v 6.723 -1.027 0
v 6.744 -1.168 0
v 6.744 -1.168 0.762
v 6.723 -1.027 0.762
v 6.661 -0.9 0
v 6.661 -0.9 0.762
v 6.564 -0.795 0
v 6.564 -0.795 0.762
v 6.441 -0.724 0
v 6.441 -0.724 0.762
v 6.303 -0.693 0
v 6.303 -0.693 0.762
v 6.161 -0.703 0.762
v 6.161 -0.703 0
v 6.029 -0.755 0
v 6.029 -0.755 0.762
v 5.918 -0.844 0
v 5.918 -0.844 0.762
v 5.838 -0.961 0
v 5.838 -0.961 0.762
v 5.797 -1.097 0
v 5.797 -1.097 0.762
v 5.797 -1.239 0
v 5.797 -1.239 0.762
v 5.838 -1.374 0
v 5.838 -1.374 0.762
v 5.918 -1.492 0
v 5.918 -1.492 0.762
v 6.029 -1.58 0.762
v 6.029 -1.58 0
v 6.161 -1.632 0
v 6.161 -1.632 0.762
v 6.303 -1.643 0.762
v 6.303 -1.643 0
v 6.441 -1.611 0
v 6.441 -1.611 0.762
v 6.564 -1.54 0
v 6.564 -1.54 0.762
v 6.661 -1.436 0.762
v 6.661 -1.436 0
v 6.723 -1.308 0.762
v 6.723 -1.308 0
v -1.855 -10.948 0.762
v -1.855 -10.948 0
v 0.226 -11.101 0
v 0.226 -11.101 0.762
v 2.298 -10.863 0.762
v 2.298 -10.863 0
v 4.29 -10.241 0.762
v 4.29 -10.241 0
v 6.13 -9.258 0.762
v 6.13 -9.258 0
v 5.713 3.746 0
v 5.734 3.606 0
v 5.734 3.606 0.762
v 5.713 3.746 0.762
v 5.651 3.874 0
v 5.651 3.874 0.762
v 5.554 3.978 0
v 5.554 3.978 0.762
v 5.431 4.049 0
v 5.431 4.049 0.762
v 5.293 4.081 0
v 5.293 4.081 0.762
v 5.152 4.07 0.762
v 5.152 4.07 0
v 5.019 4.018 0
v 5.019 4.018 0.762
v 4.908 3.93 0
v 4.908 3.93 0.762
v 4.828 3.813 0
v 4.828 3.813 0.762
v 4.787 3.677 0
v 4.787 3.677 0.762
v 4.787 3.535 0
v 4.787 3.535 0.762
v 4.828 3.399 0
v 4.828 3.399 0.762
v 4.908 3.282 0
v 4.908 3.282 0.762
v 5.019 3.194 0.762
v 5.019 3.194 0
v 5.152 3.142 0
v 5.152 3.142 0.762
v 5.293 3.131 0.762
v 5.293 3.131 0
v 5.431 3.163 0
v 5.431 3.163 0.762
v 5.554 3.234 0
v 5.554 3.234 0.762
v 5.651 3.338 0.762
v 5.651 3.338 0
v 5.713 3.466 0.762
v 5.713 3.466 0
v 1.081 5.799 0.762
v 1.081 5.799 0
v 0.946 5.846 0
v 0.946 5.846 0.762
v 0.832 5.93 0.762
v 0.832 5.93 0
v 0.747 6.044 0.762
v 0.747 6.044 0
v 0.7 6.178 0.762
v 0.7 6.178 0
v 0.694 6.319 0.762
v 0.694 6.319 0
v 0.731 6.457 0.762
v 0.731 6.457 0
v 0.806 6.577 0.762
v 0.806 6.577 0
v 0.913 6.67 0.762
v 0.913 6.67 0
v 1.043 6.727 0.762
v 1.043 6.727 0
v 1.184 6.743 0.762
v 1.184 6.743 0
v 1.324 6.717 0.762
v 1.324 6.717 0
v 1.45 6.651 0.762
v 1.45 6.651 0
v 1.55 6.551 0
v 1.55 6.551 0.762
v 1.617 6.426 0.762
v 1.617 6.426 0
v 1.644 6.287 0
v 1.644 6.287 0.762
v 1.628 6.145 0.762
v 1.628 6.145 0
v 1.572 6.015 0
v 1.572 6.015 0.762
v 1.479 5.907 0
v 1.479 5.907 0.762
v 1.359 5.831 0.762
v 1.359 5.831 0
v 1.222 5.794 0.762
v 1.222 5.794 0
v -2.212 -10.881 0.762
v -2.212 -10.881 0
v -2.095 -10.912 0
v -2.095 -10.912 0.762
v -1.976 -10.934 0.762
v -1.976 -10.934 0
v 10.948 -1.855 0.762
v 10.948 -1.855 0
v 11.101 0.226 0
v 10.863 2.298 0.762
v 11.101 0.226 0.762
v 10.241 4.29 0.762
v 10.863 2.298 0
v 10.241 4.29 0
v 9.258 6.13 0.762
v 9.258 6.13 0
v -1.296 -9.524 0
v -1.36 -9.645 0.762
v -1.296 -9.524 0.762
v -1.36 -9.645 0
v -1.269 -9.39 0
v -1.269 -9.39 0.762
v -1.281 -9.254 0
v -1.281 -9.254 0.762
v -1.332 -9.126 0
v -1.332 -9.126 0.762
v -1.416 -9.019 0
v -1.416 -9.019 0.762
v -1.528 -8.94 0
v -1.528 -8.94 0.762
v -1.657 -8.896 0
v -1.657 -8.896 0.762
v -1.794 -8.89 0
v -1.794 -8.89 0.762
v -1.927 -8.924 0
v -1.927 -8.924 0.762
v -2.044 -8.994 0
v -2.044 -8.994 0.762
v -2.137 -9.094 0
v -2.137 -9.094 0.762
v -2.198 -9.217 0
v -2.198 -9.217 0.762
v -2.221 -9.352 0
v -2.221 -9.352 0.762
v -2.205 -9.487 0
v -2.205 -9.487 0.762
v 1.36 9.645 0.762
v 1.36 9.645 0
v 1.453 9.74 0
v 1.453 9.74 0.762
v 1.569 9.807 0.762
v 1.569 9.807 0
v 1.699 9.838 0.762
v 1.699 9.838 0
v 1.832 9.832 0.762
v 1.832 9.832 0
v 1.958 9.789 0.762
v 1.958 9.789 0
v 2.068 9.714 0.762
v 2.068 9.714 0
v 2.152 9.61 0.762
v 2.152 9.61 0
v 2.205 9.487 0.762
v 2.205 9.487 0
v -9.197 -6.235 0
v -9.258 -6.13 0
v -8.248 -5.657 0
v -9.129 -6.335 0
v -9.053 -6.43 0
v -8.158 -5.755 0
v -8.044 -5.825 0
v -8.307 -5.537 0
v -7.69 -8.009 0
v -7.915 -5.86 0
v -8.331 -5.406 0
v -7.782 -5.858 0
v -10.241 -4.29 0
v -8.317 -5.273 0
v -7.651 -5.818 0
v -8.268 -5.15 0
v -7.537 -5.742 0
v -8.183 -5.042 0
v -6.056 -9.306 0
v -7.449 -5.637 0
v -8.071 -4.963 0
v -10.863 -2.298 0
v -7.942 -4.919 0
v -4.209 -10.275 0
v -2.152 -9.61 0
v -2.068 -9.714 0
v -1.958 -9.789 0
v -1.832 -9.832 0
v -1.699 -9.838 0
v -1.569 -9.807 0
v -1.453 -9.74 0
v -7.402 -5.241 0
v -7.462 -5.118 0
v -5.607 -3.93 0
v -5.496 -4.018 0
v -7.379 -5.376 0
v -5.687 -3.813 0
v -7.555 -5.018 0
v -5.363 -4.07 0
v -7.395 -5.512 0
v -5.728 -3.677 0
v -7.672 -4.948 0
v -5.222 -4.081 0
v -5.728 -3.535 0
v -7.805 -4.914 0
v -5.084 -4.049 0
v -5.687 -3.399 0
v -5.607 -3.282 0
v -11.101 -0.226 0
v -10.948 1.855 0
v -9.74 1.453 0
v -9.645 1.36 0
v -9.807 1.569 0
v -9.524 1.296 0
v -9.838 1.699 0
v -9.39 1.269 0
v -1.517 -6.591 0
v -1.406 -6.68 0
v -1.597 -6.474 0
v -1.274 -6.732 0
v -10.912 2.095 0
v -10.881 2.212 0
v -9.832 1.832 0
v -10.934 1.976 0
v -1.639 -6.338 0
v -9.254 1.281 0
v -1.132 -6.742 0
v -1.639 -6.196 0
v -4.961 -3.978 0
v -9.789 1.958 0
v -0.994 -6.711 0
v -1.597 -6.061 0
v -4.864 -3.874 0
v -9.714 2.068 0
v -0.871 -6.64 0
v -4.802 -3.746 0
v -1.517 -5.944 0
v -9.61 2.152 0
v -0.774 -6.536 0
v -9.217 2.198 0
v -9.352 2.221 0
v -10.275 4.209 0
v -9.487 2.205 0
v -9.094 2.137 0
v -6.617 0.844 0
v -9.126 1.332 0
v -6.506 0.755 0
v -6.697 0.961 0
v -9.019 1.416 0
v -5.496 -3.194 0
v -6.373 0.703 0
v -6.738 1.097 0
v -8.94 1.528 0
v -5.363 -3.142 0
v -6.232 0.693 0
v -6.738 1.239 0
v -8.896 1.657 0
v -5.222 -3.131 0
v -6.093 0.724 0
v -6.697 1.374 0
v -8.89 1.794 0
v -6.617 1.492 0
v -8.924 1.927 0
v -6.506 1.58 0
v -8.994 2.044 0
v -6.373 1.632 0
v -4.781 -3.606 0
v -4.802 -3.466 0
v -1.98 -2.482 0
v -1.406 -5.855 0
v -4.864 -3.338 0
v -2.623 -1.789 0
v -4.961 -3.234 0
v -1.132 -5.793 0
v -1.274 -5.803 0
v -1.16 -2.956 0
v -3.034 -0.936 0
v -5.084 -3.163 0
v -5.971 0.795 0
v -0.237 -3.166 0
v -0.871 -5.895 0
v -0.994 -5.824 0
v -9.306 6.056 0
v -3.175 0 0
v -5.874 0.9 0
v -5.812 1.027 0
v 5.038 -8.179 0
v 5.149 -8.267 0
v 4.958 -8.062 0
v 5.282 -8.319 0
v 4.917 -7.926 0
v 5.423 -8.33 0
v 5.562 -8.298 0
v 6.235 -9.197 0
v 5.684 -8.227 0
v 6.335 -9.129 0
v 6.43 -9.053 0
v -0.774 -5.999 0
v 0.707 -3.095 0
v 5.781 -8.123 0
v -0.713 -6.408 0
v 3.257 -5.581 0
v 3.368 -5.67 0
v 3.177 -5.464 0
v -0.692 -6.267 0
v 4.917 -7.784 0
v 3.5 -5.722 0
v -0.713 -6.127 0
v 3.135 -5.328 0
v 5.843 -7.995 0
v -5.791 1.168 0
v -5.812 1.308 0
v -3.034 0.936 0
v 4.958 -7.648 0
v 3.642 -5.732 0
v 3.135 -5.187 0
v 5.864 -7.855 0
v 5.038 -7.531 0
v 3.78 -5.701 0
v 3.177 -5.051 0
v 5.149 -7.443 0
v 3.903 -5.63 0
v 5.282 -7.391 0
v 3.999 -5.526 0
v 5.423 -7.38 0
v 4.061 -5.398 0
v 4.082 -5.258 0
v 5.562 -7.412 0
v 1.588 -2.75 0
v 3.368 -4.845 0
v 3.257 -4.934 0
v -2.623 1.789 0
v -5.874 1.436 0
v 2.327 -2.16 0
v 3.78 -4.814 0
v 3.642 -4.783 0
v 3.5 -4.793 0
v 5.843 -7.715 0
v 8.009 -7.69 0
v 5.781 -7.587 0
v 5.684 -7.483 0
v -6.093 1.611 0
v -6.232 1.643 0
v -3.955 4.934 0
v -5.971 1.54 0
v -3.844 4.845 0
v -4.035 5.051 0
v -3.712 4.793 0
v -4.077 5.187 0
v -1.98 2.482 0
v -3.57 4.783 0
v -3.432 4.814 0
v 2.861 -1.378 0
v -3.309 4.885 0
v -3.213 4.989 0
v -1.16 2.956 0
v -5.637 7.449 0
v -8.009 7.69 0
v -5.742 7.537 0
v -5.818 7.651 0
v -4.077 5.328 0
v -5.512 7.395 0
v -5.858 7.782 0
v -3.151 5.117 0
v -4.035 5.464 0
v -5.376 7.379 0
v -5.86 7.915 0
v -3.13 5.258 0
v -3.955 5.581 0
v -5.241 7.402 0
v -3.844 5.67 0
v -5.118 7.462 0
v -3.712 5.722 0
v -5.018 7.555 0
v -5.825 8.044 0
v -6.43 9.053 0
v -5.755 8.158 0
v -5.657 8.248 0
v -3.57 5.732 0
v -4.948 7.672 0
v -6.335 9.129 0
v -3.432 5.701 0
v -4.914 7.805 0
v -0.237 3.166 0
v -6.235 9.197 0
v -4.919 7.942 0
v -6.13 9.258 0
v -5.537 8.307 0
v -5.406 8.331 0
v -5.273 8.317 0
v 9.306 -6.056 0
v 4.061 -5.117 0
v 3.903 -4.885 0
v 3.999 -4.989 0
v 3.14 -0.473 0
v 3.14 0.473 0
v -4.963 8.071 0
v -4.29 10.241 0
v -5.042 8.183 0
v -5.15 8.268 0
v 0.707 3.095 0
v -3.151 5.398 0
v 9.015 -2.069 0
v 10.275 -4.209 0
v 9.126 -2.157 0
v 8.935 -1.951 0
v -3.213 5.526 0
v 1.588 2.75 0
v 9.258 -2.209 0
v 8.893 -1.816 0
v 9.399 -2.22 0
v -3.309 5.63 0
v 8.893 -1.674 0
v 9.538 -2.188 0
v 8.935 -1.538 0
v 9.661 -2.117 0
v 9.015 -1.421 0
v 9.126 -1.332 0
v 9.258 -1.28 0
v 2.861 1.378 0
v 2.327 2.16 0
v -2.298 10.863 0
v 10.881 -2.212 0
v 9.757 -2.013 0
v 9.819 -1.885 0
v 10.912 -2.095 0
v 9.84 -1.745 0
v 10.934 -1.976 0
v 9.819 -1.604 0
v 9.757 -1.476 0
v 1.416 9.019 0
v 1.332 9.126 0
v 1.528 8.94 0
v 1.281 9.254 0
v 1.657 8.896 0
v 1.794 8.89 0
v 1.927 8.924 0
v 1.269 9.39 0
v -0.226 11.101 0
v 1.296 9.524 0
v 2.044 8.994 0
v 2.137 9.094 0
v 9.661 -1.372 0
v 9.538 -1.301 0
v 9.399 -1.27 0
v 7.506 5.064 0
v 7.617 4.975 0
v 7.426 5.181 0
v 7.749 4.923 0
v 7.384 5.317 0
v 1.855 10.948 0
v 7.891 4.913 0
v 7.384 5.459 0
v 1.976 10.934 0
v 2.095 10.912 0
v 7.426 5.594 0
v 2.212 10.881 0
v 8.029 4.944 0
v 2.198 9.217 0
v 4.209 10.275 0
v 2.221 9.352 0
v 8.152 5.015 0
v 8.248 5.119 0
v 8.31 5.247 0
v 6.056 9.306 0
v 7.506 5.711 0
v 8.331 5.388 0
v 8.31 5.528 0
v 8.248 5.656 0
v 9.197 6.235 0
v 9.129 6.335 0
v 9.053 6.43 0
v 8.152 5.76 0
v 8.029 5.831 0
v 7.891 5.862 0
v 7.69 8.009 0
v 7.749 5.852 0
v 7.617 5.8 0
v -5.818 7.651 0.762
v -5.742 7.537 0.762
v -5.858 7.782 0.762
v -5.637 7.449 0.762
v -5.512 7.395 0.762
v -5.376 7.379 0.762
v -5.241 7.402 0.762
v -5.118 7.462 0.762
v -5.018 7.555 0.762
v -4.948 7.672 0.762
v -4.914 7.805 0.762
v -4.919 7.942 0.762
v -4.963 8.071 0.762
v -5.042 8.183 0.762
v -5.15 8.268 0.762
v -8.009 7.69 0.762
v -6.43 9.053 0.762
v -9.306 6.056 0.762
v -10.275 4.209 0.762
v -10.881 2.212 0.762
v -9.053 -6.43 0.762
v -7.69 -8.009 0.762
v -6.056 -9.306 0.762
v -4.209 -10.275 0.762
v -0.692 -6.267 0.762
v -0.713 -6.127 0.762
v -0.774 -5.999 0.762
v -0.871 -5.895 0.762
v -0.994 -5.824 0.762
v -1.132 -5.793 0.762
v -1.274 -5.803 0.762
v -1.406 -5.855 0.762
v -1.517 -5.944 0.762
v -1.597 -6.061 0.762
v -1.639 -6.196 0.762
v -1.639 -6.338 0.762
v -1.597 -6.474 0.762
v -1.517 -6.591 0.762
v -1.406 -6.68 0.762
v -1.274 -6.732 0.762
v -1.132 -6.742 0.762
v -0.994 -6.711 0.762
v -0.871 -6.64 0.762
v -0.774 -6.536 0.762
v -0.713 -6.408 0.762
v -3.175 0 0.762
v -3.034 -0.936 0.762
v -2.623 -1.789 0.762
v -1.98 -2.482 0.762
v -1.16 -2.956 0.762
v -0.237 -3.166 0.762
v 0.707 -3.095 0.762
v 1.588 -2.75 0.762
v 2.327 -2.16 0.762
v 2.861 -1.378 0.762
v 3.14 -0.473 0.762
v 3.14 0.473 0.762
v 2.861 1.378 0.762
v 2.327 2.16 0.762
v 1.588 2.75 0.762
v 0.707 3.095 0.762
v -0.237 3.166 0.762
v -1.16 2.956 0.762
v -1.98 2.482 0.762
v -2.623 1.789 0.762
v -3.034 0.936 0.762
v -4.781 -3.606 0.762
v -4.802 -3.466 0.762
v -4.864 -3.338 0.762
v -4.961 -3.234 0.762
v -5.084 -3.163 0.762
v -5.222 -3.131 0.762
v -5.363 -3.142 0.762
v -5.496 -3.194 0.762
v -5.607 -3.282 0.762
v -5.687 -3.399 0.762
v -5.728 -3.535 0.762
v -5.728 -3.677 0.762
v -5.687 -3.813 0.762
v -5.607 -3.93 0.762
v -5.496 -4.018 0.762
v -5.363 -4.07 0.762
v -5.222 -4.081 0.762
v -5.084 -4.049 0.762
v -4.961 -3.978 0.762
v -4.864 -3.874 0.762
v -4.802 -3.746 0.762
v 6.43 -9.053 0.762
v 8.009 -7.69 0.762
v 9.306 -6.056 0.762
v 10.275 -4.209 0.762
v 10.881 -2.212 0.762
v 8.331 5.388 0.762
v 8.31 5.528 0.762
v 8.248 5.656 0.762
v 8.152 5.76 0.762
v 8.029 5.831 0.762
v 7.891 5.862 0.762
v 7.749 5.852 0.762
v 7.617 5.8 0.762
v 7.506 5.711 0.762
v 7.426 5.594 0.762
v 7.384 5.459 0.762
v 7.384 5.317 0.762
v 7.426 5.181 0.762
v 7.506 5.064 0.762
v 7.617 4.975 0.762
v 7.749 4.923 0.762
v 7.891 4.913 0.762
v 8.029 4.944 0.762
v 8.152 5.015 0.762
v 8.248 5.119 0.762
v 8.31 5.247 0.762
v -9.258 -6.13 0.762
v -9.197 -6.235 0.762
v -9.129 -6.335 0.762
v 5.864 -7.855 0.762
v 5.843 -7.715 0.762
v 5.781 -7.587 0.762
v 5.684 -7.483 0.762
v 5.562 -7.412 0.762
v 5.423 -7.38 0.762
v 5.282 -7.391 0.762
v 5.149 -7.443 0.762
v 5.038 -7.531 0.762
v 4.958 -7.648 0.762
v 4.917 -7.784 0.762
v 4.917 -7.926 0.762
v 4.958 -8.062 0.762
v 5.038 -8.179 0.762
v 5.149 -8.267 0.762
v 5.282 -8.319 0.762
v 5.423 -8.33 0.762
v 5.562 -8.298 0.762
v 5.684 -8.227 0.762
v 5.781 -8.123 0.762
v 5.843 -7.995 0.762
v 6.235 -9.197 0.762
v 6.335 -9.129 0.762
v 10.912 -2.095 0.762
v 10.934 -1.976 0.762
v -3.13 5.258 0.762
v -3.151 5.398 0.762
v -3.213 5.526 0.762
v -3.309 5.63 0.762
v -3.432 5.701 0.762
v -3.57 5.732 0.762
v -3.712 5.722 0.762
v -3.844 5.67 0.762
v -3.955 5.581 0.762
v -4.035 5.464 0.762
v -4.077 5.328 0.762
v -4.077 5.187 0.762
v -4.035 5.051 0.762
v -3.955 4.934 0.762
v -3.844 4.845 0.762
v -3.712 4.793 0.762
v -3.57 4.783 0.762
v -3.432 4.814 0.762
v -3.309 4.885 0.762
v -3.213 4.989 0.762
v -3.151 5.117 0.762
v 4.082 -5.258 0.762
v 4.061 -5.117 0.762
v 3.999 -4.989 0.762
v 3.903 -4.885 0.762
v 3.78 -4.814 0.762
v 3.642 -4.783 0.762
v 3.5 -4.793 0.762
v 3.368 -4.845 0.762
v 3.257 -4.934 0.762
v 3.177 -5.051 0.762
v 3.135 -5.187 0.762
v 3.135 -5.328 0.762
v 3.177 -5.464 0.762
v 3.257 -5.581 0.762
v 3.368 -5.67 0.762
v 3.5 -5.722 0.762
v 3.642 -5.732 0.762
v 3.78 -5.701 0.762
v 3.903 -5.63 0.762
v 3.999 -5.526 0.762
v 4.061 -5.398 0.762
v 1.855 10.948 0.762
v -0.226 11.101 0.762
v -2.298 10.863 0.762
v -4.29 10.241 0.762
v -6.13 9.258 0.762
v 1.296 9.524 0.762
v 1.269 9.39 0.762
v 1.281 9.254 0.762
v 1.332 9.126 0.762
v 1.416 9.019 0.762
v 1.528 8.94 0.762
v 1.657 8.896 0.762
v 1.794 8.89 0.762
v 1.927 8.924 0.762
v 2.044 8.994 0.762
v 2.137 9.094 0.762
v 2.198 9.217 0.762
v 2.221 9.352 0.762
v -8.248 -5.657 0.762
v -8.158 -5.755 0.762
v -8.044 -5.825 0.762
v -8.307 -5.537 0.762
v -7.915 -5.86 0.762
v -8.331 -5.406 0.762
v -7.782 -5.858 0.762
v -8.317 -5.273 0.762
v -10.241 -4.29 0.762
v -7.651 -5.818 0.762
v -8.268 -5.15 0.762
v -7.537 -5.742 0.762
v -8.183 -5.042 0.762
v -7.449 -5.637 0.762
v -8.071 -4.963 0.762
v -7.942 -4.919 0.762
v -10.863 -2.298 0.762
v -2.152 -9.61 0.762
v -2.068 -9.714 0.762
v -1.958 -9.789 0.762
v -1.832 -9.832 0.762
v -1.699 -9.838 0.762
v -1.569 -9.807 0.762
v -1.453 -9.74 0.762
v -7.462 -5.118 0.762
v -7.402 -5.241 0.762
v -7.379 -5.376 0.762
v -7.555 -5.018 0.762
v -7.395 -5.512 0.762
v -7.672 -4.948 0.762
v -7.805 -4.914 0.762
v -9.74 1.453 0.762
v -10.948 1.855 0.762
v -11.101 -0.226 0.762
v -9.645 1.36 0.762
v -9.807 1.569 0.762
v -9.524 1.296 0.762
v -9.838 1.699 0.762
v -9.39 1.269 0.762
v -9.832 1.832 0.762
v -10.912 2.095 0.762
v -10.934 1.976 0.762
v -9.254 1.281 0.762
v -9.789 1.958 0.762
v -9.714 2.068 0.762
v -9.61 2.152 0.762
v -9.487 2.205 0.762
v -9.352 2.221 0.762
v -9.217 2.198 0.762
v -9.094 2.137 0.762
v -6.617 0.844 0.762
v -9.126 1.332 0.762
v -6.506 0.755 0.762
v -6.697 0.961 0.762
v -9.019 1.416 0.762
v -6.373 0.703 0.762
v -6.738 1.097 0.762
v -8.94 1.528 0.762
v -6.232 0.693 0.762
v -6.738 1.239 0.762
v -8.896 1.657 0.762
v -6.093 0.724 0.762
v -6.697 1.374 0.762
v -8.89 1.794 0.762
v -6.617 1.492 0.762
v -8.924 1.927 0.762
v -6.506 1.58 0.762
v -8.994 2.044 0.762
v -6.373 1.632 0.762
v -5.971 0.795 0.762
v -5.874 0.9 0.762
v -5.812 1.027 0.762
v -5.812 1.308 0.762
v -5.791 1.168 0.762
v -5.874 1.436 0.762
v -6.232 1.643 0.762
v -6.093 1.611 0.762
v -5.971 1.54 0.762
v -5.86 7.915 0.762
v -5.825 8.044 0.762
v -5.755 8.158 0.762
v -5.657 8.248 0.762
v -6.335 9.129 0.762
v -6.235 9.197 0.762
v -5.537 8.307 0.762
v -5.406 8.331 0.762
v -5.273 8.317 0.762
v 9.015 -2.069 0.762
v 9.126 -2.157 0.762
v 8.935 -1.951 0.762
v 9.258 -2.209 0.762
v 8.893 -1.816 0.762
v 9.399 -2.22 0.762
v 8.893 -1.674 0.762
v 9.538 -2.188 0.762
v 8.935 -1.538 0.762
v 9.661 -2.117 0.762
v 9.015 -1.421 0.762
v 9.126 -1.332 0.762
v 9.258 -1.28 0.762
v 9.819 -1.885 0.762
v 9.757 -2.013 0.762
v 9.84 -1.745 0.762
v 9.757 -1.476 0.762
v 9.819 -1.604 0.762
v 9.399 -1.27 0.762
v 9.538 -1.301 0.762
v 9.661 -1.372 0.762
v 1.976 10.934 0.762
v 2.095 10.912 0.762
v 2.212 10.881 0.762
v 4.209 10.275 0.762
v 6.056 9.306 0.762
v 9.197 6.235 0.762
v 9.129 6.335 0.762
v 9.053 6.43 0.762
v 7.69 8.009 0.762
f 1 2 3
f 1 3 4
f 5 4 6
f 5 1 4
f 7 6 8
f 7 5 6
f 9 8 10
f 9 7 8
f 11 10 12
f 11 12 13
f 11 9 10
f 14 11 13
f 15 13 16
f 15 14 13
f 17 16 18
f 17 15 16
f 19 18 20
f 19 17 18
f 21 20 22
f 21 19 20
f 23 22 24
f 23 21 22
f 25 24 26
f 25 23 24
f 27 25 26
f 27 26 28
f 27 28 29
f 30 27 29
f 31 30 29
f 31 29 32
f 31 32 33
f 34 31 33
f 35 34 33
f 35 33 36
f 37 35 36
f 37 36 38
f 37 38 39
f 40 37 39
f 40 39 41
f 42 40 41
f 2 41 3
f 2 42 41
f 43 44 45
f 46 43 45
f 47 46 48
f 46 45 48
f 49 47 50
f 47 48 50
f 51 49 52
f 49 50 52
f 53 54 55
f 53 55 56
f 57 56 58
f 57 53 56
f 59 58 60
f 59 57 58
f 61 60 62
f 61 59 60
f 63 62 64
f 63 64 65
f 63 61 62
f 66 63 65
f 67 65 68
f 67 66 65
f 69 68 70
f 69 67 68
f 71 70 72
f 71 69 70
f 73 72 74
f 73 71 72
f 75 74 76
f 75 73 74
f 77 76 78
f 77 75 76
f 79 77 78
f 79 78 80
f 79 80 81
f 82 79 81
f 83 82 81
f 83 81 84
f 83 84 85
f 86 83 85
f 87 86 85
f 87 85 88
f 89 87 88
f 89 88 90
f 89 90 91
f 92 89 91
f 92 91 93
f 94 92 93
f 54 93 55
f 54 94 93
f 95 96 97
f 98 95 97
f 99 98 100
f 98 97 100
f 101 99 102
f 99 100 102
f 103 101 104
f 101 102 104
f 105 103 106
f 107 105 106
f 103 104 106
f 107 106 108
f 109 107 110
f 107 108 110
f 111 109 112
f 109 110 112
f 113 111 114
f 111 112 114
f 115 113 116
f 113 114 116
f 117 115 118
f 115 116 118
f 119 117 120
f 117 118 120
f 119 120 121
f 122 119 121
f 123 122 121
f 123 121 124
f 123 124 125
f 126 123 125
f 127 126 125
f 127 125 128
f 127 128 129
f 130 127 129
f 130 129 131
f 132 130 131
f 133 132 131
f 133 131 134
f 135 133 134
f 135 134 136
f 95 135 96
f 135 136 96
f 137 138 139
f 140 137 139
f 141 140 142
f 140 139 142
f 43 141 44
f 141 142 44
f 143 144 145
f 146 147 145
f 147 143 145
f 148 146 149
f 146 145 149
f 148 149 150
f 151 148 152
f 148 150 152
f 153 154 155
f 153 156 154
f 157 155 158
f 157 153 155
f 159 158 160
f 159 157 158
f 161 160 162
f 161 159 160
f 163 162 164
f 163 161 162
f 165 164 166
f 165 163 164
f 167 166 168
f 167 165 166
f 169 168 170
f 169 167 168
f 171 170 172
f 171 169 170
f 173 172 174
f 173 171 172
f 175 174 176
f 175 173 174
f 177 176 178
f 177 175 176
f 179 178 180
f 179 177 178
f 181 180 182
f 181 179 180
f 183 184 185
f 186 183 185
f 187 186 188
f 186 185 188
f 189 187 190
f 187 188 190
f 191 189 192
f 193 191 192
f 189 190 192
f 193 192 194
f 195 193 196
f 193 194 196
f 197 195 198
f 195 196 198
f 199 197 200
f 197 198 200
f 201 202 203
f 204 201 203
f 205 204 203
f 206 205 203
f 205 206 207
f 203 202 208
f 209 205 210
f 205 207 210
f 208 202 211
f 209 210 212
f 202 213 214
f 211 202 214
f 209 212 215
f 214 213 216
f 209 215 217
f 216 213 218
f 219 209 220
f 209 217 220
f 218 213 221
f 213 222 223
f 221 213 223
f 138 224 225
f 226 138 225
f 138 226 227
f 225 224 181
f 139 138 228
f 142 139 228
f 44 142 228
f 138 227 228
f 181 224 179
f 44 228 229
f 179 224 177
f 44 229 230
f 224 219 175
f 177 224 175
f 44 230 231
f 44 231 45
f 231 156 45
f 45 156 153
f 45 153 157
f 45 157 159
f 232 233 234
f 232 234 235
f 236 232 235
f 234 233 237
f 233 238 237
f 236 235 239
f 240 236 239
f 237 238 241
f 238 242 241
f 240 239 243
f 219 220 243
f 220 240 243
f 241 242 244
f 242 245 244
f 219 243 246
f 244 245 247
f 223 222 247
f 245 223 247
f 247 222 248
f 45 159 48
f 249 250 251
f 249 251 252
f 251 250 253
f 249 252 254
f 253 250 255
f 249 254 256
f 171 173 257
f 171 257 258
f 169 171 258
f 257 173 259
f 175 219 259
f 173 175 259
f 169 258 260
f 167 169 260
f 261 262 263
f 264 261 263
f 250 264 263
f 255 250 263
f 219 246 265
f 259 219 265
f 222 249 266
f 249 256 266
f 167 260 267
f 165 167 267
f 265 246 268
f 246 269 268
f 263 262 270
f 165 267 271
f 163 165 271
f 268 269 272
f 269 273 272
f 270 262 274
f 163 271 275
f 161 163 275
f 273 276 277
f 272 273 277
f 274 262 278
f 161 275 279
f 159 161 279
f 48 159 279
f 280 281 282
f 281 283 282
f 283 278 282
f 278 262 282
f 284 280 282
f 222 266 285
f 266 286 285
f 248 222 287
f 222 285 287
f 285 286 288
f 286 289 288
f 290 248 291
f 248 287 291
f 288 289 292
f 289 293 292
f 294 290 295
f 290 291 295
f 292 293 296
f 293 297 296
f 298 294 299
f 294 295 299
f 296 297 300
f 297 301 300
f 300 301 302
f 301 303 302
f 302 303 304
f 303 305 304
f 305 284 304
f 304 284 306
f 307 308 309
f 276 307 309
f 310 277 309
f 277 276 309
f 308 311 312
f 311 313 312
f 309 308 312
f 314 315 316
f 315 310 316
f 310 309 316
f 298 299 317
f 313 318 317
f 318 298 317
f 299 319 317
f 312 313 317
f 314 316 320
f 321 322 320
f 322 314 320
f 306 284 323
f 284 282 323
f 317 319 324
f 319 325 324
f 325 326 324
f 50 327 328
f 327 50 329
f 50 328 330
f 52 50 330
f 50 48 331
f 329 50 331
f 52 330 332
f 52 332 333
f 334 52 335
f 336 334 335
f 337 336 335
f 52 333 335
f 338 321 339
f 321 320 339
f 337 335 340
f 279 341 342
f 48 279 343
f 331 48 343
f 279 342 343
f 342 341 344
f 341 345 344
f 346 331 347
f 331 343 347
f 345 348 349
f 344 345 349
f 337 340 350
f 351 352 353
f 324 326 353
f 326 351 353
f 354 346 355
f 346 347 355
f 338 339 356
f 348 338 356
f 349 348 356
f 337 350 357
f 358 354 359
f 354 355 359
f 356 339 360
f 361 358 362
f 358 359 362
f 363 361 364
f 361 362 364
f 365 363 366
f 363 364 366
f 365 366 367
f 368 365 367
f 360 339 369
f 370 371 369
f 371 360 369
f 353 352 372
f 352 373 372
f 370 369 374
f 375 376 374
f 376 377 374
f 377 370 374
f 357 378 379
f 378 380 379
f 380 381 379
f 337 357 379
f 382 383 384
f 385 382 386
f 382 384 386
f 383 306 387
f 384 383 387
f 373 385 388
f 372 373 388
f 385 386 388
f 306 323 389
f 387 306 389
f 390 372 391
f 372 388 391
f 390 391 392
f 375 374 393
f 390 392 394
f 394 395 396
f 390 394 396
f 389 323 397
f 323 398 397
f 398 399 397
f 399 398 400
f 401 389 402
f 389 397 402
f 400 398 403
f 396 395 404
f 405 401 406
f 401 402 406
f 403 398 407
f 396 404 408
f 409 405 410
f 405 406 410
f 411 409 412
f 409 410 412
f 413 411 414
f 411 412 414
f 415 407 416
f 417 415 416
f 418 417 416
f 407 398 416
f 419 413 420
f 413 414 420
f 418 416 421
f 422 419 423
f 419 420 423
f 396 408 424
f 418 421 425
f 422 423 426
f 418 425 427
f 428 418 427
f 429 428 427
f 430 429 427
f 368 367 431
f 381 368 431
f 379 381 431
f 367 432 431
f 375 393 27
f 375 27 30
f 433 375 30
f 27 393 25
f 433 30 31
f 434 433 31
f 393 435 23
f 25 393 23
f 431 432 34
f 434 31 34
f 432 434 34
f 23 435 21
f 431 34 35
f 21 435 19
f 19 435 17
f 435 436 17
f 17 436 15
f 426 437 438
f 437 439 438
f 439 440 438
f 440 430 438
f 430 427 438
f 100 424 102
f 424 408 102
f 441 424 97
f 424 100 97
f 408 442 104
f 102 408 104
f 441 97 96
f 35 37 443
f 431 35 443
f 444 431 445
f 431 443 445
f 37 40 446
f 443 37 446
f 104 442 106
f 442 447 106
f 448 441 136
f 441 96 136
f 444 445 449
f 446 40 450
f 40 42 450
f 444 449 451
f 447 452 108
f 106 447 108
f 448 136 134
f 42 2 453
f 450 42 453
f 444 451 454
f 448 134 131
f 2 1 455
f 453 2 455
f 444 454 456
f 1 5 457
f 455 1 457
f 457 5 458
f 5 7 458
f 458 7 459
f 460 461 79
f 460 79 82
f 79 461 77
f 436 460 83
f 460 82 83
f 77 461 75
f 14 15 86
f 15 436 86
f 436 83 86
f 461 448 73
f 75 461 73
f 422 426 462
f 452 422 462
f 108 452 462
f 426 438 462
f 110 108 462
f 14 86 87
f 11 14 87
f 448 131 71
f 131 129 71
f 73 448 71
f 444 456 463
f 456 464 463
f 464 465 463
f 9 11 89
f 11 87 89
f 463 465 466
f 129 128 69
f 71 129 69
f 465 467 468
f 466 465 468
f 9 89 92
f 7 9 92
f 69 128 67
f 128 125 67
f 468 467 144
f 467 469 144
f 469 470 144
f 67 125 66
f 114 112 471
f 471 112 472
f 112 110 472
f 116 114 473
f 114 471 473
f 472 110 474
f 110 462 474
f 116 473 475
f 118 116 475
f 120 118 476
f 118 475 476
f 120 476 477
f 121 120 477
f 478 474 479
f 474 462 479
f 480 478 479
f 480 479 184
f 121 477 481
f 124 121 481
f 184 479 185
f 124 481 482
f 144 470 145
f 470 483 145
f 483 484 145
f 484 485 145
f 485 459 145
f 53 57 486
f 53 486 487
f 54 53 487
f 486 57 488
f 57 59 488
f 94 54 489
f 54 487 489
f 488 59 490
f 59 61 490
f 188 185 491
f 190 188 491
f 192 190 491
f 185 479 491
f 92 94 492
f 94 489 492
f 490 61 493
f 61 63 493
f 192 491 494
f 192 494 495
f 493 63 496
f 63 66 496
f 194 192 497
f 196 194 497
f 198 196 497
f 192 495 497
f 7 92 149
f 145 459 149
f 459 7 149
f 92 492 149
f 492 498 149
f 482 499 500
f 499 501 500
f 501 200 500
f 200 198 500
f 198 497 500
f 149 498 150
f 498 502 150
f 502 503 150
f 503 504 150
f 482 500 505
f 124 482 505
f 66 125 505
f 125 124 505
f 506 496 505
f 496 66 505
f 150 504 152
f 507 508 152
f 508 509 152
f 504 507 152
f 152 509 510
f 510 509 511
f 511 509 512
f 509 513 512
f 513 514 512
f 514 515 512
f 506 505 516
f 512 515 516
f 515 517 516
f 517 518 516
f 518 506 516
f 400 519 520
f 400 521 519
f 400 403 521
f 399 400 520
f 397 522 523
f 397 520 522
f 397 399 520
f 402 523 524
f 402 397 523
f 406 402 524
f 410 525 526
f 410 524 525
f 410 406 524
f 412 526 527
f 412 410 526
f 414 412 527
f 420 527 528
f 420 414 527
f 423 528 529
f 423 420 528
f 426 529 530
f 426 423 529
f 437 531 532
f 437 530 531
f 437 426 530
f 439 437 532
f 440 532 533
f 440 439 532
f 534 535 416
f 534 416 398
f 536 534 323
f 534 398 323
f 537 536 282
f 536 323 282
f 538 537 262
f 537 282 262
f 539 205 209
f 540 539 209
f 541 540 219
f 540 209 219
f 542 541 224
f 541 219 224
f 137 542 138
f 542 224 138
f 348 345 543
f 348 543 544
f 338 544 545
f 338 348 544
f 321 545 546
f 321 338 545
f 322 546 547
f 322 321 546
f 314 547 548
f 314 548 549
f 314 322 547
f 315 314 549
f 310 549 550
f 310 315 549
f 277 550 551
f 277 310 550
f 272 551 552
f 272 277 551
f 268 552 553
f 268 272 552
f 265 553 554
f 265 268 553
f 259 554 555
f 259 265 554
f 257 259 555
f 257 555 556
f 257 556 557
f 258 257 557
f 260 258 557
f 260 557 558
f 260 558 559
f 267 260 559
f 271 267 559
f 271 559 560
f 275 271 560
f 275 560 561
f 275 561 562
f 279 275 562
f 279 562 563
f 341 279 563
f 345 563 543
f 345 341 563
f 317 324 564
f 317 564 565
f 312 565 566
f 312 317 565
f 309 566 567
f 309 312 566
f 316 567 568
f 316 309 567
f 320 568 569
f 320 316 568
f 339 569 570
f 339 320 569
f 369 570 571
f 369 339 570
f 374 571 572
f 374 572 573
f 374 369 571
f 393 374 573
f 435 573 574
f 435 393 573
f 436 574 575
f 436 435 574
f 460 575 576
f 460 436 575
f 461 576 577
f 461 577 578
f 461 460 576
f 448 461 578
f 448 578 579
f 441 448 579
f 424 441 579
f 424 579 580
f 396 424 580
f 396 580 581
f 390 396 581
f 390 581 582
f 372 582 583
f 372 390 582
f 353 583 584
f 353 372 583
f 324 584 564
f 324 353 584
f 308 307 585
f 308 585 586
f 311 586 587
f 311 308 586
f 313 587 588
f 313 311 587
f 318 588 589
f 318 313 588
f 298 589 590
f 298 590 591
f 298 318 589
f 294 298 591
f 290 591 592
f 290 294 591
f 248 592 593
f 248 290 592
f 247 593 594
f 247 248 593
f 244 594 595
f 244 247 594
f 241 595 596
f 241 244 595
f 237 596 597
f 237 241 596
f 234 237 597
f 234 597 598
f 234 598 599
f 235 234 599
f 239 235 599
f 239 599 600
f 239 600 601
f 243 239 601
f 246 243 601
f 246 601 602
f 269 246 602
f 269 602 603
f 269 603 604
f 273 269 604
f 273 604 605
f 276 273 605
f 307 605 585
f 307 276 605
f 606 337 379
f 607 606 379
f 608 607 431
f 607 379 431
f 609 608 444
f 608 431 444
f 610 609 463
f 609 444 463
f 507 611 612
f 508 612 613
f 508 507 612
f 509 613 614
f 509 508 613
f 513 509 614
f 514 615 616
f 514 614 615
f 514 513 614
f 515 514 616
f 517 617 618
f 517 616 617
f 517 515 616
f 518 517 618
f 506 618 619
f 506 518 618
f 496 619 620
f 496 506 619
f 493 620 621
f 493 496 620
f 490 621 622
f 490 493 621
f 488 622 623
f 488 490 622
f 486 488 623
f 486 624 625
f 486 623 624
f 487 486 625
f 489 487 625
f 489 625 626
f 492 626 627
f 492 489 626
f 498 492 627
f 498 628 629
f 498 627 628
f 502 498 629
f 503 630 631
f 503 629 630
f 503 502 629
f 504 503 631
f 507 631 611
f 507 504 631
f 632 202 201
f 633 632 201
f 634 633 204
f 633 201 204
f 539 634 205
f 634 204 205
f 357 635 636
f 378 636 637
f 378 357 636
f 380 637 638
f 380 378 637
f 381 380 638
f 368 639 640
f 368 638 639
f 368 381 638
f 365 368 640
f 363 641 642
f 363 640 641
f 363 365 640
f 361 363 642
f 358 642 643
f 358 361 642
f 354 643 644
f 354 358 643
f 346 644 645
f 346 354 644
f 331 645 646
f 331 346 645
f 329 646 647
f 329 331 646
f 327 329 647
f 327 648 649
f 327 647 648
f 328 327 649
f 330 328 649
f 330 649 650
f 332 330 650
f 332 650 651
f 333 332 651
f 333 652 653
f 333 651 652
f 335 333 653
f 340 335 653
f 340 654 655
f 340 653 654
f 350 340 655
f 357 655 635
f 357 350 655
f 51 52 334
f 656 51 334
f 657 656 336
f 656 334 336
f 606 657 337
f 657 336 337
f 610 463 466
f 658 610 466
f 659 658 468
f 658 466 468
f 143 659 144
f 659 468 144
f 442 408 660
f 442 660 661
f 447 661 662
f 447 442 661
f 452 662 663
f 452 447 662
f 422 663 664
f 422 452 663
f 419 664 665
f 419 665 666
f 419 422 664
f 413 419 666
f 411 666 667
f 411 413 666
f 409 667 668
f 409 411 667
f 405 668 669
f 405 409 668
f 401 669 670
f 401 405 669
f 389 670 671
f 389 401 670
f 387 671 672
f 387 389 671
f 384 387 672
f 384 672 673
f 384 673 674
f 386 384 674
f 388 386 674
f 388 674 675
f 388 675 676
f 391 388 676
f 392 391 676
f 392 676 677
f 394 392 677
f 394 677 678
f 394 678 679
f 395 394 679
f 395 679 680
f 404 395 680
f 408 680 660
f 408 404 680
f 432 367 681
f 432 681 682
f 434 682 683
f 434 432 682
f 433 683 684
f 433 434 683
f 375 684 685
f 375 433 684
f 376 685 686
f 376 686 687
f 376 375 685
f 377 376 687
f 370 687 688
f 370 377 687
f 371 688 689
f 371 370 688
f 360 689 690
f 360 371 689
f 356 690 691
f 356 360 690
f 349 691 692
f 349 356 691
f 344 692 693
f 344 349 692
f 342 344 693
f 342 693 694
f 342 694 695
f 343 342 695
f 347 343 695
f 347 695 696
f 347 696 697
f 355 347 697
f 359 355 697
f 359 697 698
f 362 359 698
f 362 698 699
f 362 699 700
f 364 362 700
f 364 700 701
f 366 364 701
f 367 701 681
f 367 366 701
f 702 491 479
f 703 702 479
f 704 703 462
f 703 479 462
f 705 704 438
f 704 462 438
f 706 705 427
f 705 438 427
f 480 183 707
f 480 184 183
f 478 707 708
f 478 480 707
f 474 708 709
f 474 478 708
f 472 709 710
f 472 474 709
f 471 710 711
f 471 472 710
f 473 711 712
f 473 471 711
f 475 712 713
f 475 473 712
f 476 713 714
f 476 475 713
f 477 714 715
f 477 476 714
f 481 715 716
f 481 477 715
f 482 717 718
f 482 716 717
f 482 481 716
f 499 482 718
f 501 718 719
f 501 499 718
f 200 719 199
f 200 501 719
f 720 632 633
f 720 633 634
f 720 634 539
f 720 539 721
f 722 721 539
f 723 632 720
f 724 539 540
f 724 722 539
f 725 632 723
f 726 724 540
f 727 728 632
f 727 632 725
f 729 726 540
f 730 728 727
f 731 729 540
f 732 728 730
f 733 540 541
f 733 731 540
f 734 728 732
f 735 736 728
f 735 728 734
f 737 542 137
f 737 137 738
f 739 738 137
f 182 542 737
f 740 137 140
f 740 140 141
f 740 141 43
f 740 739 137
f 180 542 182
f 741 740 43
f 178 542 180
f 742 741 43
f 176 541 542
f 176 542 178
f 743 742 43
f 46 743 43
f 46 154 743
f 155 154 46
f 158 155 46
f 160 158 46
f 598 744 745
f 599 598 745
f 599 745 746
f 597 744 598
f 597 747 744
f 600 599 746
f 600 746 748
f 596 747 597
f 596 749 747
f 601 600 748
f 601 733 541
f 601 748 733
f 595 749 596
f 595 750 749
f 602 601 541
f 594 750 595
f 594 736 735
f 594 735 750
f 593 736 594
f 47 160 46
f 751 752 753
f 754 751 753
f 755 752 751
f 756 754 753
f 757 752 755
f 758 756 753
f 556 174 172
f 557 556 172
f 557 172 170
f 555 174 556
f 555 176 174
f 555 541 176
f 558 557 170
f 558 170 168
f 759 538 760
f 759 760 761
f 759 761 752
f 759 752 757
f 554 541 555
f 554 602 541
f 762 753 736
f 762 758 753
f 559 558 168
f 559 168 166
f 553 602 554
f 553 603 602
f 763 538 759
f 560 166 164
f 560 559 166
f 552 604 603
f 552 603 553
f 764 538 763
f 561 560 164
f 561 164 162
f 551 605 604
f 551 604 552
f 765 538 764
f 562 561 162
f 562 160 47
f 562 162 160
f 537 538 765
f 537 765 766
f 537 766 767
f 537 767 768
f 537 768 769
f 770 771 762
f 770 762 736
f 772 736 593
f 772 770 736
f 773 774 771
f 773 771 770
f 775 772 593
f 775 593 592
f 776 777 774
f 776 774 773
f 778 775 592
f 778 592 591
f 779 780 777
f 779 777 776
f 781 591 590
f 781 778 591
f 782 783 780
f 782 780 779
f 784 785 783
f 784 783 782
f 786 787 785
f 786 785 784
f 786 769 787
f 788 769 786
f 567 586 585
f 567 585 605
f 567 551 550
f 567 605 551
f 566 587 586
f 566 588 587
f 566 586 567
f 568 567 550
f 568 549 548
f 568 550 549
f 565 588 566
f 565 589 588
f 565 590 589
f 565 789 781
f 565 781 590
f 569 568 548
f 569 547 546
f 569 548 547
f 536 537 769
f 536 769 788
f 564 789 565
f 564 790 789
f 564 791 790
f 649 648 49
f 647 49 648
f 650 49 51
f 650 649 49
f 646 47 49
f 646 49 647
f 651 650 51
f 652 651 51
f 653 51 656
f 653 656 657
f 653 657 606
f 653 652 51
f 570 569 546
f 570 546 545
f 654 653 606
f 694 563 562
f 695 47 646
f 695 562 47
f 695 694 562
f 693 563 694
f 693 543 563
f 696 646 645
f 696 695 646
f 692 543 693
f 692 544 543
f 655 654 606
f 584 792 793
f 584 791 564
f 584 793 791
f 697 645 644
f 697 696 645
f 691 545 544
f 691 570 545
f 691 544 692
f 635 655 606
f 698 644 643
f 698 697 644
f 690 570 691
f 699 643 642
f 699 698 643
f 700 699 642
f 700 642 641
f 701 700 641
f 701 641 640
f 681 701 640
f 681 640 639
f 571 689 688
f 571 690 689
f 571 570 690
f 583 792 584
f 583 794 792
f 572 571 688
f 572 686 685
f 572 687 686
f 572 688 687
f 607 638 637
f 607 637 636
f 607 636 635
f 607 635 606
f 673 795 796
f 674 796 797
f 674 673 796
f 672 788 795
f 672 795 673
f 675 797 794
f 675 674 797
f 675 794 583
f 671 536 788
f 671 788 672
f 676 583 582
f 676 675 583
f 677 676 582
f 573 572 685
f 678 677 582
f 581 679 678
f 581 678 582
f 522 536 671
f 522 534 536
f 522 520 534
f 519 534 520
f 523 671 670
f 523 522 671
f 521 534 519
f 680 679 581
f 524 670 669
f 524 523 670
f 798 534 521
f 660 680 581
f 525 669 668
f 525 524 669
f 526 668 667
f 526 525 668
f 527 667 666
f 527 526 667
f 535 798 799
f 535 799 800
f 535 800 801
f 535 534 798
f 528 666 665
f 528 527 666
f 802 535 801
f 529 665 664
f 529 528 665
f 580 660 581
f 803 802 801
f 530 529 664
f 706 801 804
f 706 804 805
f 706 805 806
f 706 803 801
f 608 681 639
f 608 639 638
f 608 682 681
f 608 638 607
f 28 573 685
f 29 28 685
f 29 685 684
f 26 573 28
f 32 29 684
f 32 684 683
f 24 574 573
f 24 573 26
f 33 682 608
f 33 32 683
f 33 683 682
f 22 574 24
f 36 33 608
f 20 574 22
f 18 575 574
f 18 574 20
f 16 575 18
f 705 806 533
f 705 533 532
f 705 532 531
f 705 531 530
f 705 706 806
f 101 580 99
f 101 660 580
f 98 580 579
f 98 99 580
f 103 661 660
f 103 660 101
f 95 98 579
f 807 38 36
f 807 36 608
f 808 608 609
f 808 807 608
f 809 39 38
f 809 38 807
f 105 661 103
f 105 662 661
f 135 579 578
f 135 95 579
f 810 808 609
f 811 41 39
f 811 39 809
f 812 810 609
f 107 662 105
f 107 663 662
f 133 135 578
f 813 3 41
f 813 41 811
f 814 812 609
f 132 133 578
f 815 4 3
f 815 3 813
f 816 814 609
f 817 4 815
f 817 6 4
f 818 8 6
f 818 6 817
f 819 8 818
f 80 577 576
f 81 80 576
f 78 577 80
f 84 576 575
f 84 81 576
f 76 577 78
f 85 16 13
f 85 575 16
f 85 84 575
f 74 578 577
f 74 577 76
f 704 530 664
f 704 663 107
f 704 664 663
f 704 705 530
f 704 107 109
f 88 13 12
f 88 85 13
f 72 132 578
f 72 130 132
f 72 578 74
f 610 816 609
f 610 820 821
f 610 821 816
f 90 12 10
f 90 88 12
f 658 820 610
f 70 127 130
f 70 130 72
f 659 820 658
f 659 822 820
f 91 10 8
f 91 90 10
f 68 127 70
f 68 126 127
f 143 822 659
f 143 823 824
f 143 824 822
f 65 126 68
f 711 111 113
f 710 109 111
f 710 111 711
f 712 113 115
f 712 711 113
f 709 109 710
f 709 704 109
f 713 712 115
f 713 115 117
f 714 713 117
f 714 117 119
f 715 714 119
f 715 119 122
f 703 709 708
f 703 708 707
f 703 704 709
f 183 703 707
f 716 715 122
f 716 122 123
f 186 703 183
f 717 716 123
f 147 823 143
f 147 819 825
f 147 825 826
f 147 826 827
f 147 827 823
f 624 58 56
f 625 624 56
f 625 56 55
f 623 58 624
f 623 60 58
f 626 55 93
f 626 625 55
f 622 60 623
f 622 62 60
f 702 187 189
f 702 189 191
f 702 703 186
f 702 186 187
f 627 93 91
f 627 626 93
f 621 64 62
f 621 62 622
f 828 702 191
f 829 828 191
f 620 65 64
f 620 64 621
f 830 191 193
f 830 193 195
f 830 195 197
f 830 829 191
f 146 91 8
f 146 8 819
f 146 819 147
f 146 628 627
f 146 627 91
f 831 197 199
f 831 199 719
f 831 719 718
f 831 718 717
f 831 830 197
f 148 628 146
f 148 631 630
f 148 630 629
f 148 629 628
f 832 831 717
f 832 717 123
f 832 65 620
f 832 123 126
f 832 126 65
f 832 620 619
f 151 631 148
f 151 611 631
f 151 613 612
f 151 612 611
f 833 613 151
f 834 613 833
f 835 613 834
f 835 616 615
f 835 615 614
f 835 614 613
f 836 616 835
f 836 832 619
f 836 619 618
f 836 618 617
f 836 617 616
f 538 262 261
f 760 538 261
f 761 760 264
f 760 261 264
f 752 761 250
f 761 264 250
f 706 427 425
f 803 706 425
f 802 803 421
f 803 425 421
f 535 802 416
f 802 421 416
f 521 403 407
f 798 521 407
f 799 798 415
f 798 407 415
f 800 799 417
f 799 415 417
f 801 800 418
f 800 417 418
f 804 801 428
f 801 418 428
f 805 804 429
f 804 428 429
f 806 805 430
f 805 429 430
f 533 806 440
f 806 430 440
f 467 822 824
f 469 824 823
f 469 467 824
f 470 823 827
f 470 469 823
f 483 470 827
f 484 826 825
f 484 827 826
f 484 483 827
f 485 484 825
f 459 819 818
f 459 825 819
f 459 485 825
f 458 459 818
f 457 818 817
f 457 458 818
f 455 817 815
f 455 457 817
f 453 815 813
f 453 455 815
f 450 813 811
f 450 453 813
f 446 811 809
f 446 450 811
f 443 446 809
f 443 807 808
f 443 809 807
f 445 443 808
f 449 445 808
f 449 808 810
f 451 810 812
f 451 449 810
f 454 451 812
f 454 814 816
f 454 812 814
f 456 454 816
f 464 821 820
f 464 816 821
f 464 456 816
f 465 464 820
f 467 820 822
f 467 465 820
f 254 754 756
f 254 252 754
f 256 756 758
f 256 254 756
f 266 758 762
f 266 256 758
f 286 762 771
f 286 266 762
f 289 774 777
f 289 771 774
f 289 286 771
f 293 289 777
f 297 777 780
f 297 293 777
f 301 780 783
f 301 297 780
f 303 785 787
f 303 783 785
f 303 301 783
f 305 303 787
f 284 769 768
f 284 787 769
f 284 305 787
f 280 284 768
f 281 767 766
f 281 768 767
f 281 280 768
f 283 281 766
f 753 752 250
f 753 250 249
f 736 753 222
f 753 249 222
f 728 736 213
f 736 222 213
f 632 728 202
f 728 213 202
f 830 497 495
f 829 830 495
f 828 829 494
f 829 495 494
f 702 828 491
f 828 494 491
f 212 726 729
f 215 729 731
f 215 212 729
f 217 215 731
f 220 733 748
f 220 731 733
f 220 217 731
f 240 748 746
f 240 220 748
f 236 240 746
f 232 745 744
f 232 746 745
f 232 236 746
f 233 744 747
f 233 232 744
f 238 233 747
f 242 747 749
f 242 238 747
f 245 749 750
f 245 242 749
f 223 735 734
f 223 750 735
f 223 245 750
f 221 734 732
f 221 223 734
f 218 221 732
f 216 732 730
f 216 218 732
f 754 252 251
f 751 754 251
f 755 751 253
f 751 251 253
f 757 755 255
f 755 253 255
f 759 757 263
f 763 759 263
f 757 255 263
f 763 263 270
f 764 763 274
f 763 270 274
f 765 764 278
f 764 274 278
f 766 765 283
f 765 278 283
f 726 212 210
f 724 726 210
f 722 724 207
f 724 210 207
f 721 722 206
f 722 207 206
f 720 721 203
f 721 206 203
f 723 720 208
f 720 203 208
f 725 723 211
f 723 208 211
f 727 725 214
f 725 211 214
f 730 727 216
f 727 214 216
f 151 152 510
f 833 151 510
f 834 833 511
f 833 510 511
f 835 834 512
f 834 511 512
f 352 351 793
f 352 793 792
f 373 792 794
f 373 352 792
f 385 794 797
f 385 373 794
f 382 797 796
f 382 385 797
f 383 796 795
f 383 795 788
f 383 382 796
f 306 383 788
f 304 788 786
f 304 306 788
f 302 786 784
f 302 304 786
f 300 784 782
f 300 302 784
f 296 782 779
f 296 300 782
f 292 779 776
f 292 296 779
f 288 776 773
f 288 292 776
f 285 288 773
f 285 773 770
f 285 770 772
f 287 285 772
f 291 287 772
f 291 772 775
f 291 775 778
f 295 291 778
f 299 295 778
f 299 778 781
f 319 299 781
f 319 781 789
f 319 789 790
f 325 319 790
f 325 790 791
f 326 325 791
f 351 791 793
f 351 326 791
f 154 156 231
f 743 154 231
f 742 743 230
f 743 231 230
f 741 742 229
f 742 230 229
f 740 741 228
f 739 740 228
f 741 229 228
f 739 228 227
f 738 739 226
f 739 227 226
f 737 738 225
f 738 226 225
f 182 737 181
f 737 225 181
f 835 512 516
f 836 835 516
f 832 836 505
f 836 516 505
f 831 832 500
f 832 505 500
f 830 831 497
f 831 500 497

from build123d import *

# Parameters (mm, degrees)
SKETCH1_R           = 0.47625
SKETCH1_R_2         = 3.175
BOSS_EXTRUDE1_DEPTH = 0.762
BOSS_EXTRUDE2_START = -0.762
SKETCH2_R           = 11.103539479
BOSS_EXTRUDE2_DEPTH = 0.762


with BuildPart() as part:
    # Sketch1 → Boss-Extrude1 (new body)
    with BuildSketch(Plane.XY):
        with BuildLine():
            ThreePointArc((-2.039848362, 9.751221095), (-4.130378192, 9.88369568), (-6.129577027, 9.25834098))
            ThreePointArc((-6.129577027, 9.25834098), (-6.747337126, 8.674137968), (-6.975028685, 7.854944918))
            ThreePointArc((-6.975028685, 7.854944918), (-7.339372349, 6.47410056), (-8.33754517, 5.452763952))
            ThreePointArc((-8.33754517, 5.452763952), (-9.909445645, 4.068211113), (-10.880900197, 2.212373372))
            ThreePointArc((-10.880900197, 2.212373372), (-10.904630014, 1.362455548), (-10.4863749, 0.622194736))
            ThreePointArc((-10.4863749, 0.622194736), (-9.767600366, -0.61183955), (-9.751221095, -2.039848362))
            ThreePointArc((-9.751221095, -2.039848362), (-9.883695679, -4.130378205), (-9.258340968, -6.129577051))
            ThreePointArc((-9.258340968, -6.129577051), (-8.674137957, -6.747337133), (-7.854944918, -6.975028685))
            ThreePointArc((-7.854944918, -6.975028685), (-6.47410056, -7.339372349), (-5.452763952, -8.33754517))
            ThreePointArc((-5.452763952, -8.33754517), (-4.068210251, -9.909446321), (-2.212371278, -10.880900842))
            ThreePointArc((-2.212371278, -10.880900842), (-1.362454485, -10.90462975), (-0.622194736, -10.4863749))
            ThreePointArc((-0.622194736, -10.4863749), (0.61183955, -9.767600366), (2.039848362, -9.751221095))
            ThreePointArc((2.039848362, -9.751221095), (4.130377433, -9.883695772), (6.129575677, -9.258341694))
            ThreePointArc((6.129575677, -9.258341694), (6.747336732, -8.674138622), (6.975028685, -7.854944918))
            ThreePointArc((6.975028685, -7.854944918), (7.339372349, -6.47410056), (8.33754517, -5.452763952))
            ThreePointArc((8.33754517, -5.452763952), (9.909446191, -4.068210417), (10.880900717, -2.212371682))
            ThreePointArc((10.880900717, -2.212371682), (10.904629801, -1.36245469), (10.4863749, -0.622194736))
            ThreePointArc((10.4863749, -0.622194736), (9.767600366, 0.61183955), (9.751221095, 2.039848362))
            ThreePointArc((9.751221095, 2.039848362), (9.883695769, 4.130377457), (9.258341673, 6.129575719))
            ThreePointArc((9.258341673, 6.129575719), (8.674138602, 6.747336744), (7.854944918, 6.975028685))
            ThreePointArc((7.854944918, 6.975028685), (6.47410056, 7.339372349), (5.452763952, 8.33754517))
            ThreePointArc((5.452763952, 8.33754517), (4.068210359, 9.909446236), (2.212371542, 10.880900761))
            ThreePointArc((2.212371542, 10.880900761), (1.362454619, 10.904629783), (0.622194736, 10.4863749))
            ThreePointArc((0.622194736, 10.4863749), (-0.61183955, 9.767600366), (-2.039848362, 9.751221095))
        make_face()
        with Locations((-7.854944918, -5.387528685)):
            Circle(SKETCH1_R, mode=Mode.SUBTRACT)
        with Locations((-1.167787514, -6.267444918)):
            Circle(SKETCH1_R, mode=Mode.SUBTRACT)
        with Locations((-5.257503273, -3.606002332)):
            Circle(SKETCH1_R, mode=Mode.SUBTRACT)
        with Locations(Location((0, 0, 0), (0, 0, 180))):
            Circle(SKETCH1_R_2, mode=Mode.SUBTRACT)
        with Locations((3.606002332, -5.257503273)):
            Circle(SKETCH1_R, mode=Mode.SUBTRACT)
        with Locations((5.387528685, -7.854944918)):
            Circle(SKETCH1_R, mode=Mode.SUBTRACT)
        with Locations((9.363842884, -1.744726751)):
            Circle(SKETCH1_R, mode=Mode.SUBTRACT)
        with Locations((6.267444918, -1.167787514)):
            Circle(SKETCH1_R, mode=Mode.SUBTRACT)
        with Locations((-9.363842884, 1.744726751)):
            Circle(SKETCH1_R, mode=Mode.SUBTRACT)
        with Locations((-6.267444918, 1.167787514)):
            Circle(SKETCH1_R, mode=Mode.SUBTRACT)
        with Locations((-3.606002332, 5.257503273)):
            Circle(SKETCH1_R, mode=Mode.SUBTRACT)
        with Locations((-5.387528685, 7.854944918)):
            Circle(SKETCH1_R, mode=Mode.SUBTRACT)
        with Locations((5.257503273, 3.606002332)):
            Circle(SKETCH1_R, mode=Mode.SUBTRACT)
        with BuildLine():
            ThreePointArc((1.255023852, 6.735637063), (1.635979659, 6.180208581), (1.080551177, 5.799252774))
            ThreePointArc((1.080551177, 5.799252774), (0.69959537, 6.354681256), (1.255023852, 6.735637063))
        make_face(mode=Mode.SUBTRACT)
        with Locations((1.744726751, 9.363842884)):
            Circle(SKETCH1_R, mode=Mode.SUBTRACT)
        with Locations((7.854944918, 5.387528685)):
            Circle(SKETCH1_R, mode=Mode.SUBTRACT)
        with Locations((-1.744726751, -9.363842884)):
            Circle(SKETCH1_R, mode=Mode.SUBTRACT)
    extrude(amount=BOSS_EXTRUDE1_DEPTH)

    # Sketch2 → Boss-Extrude2 (add)
    with BuildSketch(Plane.XY.offset(0.762).offset(BOSS_EXTRUDE2_START)):
        Circle(SKETCH2_R)
        with BuildLine():
            ThreePointArc((8.267572946, 5.149721676), (9.364843608, 2.67807766), (9.740246185, 0))
            ThreePointArc((9.740246185, 0), (9.716357017, -0.681763934), (9.644806696, -1.360183646))
            ThreePointArc((9.644806696, -1.360183646), (9.788473946, -1.529082312), (9.840092885, -1.744726751))
            ThreePointArc((9.840092885, -1.744726751), (9.741789124, -2.034503739), (9.487460012, -2.204653776))
            ThreePointArc((9.487460012, -2.204653776), (8.163793491, -5.312708498), (5.858113138, -7.781703297))
            ThreePointArc((5.858113138, -7.781703297), (5.862360186, -7.818214708), (5.863778685, -7.854944918))
            ThreePointArc((5.863778685, -7.854944918), (5.625812627, -8.267297711), (5.149721676, -8.267572946))
            ThreePointArc((5.149721676, -8.267572946), (2.016021533, -9.529325943), (-1.360183646, -9.644806696))
            ThreePointArc((-1.360183646, -9.644806696), (-1.831963088, -9.832035029), (-2.204653776, -9.487460012))
            ThreePointArc((-2.204653776, -9.487460012), (-5.312708498, -8.163793491), (-7.781703297, -5.858113138))
            ThreePointArc((-7.781703297, -5.858113138), (-8.247692164, -5.656905119), (-8.267572946, -5.149721676))
            ThreePointArc((-8.267572946, -5.149721676), (-9.529325943, -2.016021533), (-9.644806696, 1.360183646))
            ThreePointArc((-9.644806696, 1.360183646), (-9.832035029, 1.831963088), (-9.487460012, 2.204653776))
            ThreePointArc((-9.487460012, 2.204653776), (-8.163793491, 5.312708498), (-5.858113138, 7.781703297))
            ThreePointArc((-5.858113138, 7.781703297), (-5.656905119, 8.247692164), (-5.149721676, 8.267572946))
            ThreePointArc((-5.149721676, 8.267572946), (-2.016021533, 9.529325943), (1.360183646, 9.644806696))
            ThreePointArc((1.360183646, 9.644806696), (1.831963088, 9.832035029), (2.204653776, 9.487460012))
            ThreePointArc((2.204653776, 9.487460012), (5.312708498, 8.163793491), (7.781703297, 5.858113138))
            ThreePointArc((7.781703297, 5.858113138), (8.164729311, 5.74925744), (8.331194918, 5.387528685))
            ThreePointArc((8.331194918, 5.387528685), (8.315014565, 5.264443421), (8.267572946, 5.149721676))
        make_face(mode=Mode.SUBTRACT)
    extrude(amount=BOSS_EXTRUDE2_DEPTH)


solid = part.part
